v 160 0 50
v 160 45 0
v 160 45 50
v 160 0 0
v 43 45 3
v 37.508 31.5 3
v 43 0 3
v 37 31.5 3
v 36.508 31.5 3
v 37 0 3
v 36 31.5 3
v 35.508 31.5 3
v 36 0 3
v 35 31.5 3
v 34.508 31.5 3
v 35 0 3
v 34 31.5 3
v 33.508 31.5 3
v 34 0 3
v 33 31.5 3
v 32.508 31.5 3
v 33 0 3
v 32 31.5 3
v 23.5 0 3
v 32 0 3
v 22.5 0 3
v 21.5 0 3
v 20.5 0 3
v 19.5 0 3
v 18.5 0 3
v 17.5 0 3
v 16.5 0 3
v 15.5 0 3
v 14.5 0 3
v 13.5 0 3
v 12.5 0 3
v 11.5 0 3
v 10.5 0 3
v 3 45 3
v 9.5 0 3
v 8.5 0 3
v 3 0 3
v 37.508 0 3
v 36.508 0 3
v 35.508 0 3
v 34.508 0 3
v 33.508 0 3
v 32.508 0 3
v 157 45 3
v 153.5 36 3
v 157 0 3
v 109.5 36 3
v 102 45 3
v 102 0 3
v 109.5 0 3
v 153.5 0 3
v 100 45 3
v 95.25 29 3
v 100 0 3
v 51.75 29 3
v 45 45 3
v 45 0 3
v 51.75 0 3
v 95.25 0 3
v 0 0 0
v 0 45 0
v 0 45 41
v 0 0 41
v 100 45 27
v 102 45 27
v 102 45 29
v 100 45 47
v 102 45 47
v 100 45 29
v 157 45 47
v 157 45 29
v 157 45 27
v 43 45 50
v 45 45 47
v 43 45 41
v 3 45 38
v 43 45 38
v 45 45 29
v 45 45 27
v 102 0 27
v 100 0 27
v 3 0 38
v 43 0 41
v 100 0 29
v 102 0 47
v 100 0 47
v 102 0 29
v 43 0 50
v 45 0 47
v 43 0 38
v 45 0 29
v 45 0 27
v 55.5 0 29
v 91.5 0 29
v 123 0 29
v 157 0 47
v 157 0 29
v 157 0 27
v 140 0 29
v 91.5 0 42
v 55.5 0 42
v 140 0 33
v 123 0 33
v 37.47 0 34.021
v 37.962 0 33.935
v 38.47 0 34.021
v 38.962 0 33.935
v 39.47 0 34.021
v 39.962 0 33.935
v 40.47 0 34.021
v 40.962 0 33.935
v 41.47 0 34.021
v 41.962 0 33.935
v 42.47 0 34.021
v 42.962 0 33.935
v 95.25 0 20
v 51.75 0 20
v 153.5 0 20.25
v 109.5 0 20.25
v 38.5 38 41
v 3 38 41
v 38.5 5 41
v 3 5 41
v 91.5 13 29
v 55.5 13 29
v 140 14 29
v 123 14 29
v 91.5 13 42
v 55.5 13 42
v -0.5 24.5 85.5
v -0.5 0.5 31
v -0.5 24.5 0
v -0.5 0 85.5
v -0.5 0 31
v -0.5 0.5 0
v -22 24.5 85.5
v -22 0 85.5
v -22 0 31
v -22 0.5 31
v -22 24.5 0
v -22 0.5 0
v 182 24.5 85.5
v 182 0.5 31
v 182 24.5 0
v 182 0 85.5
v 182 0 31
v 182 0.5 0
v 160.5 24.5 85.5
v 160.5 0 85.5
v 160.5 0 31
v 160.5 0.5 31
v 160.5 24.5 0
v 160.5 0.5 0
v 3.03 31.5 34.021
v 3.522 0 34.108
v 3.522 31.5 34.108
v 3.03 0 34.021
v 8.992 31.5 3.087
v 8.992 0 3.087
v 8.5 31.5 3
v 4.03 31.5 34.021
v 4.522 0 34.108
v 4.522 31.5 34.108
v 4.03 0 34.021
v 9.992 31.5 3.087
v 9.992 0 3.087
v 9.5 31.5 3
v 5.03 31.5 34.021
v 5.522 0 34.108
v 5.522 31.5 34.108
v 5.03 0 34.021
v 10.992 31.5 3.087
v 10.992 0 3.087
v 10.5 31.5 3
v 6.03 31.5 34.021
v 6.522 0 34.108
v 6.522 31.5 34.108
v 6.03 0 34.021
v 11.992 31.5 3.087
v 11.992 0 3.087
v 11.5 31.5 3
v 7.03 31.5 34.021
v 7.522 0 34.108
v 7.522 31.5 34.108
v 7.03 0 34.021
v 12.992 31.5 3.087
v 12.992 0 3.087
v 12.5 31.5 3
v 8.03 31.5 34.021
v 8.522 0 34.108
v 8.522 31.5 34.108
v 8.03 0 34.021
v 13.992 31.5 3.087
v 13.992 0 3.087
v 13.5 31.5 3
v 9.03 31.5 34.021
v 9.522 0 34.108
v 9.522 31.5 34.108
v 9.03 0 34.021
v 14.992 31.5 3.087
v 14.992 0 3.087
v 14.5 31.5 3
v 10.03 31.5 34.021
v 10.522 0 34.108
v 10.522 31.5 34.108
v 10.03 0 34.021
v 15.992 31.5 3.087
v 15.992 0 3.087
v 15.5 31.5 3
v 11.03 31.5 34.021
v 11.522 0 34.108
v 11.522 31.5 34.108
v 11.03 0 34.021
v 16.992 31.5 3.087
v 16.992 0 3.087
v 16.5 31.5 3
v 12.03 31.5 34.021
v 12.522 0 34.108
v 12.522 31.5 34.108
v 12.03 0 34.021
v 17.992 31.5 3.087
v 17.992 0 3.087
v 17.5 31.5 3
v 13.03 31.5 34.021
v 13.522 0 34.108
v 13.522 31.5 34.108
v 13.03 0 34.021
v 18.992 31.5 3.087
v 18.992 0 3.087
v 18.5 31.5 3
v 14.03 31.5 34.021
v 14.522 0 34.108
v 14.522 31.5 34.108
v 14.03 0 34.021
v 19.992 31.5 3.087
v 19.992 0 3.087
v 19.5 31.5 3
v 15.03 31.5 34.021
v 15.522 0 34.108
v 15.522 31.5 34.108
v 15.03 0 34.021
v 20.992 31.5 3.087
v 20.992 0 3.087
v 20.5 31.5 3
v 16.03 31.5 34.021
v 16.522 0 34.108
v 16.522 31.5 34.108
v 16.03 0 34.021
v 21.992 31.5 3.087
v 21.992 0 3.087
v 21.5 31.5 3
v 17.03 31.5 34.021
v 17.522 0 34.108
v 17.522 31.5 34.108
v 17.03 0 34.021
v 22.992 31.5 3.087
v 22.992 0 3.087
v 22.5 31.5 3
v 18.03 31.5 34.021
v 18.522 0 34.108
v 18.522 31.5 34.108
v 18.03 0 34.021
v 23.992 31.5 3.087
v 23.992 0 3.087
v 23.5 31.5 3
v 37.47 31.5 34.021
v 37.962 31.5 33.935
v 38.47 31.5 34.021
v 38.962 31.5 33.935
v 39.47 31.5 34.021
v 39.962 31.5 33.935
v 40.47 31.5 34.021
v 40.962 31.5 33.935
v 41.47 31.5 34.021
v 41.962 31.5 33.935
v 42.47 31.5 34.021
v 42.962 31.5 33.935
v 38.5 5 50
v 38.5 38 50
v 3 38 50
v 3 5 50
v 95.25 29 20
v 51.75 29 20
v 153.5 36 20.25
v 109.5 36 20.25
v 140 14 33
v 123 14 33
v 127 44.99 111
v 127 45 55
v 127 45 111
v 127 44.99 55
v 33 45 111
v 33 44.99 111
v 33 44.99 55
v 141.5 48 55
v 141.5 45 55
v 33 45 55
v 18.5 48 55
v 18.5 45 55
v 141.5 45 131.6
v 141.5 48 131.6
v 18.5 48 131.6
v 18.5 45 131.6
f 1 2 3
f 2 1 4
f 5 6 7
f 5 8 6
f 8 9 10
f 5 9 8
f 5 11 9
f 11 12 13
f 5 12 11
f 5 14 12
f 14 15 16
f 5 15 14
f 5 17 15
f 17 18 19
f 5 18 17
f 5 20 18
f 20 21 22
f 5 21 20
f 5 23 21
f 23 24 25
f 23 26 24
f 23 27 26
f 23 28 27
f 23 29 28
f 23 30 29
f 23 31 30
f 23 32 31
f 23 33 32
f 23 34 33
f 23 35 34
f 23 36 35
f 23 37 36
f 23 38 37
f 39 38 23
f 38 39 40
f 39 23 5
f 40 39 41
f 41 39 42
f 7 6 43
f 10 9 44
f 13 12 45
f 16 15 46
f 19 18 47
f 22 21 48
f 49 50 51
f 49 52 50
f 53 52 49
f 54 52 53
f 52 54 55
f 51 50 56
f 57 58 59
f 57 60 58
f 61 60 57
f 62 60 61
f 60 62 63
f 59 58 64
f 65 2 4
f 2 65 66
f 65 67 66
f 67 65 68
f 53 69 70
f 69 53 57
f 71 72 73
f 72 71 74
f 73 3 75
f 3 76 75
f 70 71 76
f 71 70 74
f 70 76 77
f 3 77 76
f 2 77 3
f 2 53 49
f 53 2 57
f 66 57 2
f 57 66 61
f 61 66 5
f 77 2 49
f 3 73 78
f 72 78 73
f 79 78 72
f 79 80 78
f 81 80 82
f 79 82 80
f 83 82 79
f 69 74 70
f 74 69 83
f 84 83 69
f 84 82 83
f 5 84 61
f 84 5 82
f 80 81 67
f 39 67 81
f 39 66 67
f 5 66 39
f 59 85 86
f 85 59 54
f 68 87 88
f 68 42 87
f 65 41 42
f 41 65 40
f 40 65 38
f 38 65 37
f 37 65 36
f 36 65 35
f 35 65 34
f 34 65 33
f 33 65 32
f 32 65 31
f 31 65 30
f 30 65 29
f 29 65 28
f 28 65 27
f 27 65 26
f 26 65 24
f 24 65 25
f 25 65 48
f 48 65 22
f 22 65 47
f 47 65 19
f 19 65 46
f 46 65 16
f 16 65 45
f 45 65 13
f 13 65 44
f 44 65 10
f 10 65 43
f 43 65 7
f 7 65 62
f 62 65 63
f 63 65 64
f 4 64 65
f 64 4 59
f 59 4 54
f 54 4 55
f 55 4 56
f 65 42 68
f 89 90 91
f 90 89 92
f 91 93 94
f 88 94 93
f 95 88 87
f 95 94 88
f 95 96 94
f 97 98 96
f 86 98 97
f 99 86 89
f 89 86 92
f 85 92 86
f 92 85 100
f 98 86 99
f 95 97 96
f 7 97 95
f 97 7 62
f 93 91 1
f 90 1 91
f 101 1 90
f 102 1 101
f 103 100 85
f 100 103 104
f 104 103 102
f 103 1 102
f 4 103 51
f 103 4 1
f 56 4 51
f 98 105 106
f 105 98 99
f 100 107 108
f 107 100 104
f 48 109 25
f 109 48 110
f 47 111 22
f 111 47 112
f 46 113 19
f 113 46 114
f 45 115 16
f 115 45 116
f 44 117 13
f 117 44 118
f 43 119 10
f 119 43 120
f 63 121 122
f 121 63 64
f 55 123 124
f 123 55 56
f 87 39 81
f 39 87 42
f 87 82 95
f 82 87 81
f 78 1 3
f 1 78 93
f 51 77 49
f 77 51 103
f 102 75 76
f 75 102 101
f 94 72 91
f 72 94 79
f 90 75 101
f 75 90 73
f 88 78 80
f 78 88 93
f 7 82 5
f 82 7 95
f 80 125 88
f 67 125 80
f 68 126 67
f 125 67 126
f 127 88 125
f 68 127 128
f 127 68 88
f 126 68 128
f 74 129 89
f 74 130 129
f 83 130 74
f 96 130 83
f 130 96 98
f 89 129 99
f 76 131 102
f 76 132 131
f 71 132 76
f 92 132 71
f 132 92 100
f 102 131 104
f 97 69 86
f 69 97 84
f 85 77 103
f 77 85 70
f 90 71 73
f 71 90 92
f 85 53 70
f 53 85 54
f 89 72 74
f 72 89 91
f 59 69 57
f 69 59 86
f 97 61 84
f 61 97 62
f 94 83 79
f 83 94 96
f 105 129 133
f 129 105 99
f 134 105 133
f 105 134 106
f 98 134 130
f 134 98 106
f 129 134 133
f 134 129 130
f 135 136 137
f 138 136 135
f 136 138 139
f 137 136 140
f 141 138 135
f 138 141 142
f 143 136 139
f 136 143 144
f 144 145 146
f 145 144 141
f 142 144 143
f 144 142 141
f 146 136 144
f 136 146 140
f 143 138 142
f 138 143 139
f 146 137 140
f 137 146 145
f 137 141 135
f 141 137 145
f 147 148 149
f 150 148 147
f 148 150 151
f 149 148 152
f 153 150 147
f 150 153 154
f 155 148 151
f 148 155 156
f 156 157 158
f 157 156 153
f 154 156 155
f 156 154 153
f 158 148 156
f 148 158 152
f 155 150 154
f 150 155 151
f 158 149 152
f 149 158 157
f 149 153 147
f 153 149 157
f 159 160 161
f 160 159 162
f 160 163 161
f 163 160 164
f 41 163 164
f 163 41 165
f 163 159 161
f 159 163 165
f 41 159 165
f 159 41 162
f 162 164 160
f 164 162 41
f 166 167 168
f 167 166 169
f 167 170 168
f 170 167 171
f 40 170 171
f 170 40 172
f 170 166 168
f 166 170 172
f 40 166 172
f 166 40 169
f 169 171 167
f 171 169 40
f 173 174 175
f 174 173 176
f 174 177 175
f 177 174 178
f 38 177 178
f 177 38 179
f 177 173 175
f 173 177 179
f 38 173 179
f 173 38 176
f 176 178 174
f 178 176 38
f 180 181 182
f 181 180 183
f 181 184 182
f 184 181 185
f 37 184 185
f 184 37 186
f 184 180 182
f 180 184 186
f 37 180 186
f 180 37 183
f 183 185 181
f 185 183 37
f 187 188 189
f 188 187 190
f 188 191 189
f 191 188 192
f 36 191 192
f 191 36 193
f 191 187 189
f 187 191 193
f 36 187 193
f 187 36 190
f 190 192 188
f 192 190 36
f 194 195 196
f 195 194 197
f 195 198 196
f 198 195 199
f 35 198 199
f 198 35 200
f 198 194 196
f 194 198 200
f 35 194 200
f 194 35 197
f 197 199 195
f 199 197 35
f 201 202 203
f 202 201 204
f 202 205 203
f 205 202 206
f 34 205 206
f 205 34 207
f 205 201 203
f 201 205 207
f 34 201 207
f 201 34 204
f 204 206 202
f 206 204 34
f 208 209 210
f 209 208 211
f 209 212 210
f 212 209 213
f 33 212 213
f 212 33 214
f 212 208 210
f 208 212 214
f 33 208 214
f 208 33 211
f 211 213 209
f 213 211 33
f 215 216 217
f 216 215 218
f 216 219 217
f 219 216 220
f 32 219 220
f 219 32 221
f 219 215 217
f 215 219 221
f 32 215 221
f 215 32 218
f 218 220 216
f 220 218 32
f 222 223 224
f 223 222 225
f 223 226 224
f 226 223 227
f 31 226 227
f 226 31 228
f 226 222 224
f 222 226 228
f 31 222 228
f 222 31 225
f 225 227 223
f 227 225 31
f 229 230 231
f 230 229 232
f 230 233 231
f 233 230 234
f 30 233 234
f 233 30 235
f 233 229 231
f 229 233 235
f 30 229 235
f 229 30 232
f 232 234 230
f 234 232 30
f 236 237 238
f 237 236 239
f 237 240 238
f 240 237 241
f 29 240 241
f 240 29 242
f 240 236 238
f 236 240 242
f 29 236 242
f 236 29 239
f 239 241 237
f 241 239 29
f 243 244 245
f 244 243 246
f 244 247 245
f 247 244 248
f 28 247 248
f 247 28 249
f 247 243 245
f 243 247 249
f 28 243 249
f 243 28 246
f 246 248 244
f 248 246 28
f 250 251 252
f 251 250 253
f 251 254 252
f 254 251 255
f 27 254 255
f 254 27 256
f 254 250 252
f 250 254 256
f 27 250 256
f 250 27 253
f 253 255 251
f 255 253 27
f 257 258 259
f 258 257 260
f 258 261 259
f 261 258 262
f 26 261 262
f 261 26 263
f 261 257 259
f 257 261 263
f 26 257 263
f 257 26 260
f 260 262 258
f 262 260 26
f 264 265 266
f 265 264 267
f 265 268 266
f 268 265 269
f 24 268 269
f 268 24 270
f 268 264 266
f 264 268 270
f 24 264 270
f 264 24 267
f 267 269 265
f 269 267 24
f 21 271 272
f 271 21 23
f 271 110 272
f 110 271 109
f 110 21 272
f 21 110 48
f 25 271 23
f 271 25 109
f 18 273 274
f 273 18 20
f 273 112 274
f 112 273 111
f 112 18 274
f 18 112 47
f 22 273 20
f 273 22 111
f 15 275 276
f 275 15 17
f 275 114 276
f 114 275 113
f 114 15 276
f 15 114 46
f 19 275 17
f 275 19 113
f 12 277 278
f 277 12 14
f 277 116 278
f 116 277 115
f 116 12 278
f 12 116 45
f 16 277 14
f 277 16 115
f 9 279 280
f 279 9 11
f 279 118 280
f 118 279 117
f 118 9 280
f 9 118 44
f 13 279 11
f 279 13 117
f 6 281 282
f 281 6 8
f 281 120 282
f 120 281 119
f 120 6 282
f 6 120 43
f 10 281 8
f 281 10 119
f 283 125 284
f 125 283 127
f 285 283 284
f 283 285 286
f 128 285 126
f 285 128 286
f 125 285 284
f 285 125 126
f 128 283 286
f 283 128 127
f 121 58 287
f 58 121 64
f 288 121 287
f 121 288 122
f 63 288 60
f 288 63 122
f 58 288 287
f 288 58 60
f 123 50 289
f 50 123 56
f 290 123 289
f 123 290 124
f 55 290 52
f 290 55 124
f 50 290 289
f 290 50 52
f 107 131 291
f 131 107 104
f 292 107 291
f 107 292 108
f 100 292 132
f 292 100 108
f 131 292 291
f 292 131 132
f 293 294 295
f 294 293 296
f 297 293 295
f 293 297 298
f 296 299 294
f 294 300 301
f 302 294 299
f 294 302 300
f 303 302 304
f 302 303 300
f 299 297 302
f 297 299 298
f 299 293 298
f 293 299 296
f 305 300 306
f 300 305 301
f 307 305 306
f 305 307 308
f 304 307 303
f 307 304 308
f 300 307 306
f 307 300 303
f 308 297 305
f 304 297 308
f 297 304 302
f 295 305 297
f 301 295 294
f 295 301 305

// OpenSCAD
largeur = 160;
hauteur = 50;
profondeur = 45;
epaisseur_bois = 3;
epaisseur_caisson = 2;
largeur_caisson = 55;
largeur_plateau_haut = (largeur_caisson*2)+(epaisseur_caisson*2)+epaisseur_bois;
largeur_plateau_bas = largeur - largeur_plateau_haut;
hauteur_caisson_vinyle = 35;
hauteur_caisson_hifi = (hauteur / 2)  - (epaisseur_caisson / 2);
espace_hifi = (largeur_caisson - 43.5) / 2;
espace_pc = (largeur_caisson - 44) / 2;
espace_enceinte_centrale = (largeur_caisson - 36) / 2;
espace_decodeur = (largeur_caisson - 17) / 2;
espace_tv = (largeur - 94) / 2;
espace_new_tv = (largeur - 123) / 2;

module platine() {
    color("black") {
        cube([35.5,33,9]);
    }
}

module hifi() {
    color("black") {
        cube([43.5,29,17]);
    }
}

module pc() {
    color("black") {
        cube([44,36,17.25]);
    }
}

module enceinte_centrale() {
    color("black") cube([36,0.5,13]);
    color([0.42,0.09,0.09]) translate([0,0.5,0]) cube([36,12.5,13]);    
}

module enceinte_laterale() {
    color("black") translate([0,0,31]) cube([21.5,0.5,54.5]);
    color([0.42,0.09,0.09]) translate([0,0.5,0]) cube([21.5,24,85.5]);
}

module decodeur() {
    color("black") cube([17,14,4]);
}

module tv() {
    color("grey") cube([94,3,56]);
} 

module new_tv() {
    color("black") cube([123,3,76.6]);
}

module vinyle() {
 color("red") cube([0.5,31.5,31.5]);
}

color("grey") {
    //plancher
    cube([largeur,profondeur,epaisseur_bois]);
    
    //côtés;
    cube([epaisseur_bois, profondeur, hauteur_caisson_vinyle + epaisseur_bois]);
    translate([largeur-epaisseur_bois,0,0]) cube([epaisseur_bois, profondeur, hauteur]);
    
    //plateaux
    translate([largeur - largeur_plateau_haut ,0,hauteur-epaisseur_bois]) cube([largeur_plateau_haut,profondeur,epaisseur_bois]);
    translate([0,0,hauteur_caisson_vinyle+epaisseur_bois]) cube([largeur_plateau_bas,profondeur,epaisseur_bois]);
    translate([largeur - largeur_plateau_haut ,0,hauteur_caisson_hifi+epaisseur_bois]) cube([largeur_plateau_haut,profondeur,epaisseur_caisson]);
	
    //caissons
    translate([largeur - epaisseur_caisson - epaisseur_bois - largeur_caisson, 0,0]) cube([epaisseur_caisson, profondeur, hauteur]);
    translate([largeur - (epaisseur_caisson*2) - epaisseur_bois - (largeur_caisson*2), 0,0]) cube([epaisseur_caisson, profondeur, hauteur]);
	
}

//placement matos
translate([3,5,hauteur_caisson_vinyle + epaisseur_bois*2]) platine();
translate([largeur_plateau_bas+epaisseur_bois+espace_hifi,0,epaisseur_bois]) hifi();
translate([largeur_plateau_bas+epaisseur_bois+espace_enceinte_centrale,0,epaisseur_bois+epaisseur_caisson+hauteur_caisson_hifi]) enceinte_centrale();
translate([-22,0,0]) enceinte_laterale();
translate([largeur+0.5,0,0]) enceinte_laterale();
translate([largeur_plateau_bas+(epaisseur_bois*2)+largeur_caisson+espace_pc,0,epaisseur_bois]) pc();
translate([largeur_plateau_bas+(epaisseur_bois*2)+largeur_caisson+espace_decodeur,0,epaisseur_bois+epaisseur_caisson+hauteur_caisson_hifi]) decodeur();
translate([espace_tv,profondeur-0.01,hauteur+5]) tv();
translate([espace_new_tv,profondeur,hauteur+5]) new_tv();

//placement vinyles
for (i =[0:15]) translate([8.5+i,0,epaisseur_bois]) rotate([0,-10,0]) vinyle();
for (i =[0:5]) translate([32+i,0,epaisseur_bois]) rotate([0,10,0]) vinyle();
